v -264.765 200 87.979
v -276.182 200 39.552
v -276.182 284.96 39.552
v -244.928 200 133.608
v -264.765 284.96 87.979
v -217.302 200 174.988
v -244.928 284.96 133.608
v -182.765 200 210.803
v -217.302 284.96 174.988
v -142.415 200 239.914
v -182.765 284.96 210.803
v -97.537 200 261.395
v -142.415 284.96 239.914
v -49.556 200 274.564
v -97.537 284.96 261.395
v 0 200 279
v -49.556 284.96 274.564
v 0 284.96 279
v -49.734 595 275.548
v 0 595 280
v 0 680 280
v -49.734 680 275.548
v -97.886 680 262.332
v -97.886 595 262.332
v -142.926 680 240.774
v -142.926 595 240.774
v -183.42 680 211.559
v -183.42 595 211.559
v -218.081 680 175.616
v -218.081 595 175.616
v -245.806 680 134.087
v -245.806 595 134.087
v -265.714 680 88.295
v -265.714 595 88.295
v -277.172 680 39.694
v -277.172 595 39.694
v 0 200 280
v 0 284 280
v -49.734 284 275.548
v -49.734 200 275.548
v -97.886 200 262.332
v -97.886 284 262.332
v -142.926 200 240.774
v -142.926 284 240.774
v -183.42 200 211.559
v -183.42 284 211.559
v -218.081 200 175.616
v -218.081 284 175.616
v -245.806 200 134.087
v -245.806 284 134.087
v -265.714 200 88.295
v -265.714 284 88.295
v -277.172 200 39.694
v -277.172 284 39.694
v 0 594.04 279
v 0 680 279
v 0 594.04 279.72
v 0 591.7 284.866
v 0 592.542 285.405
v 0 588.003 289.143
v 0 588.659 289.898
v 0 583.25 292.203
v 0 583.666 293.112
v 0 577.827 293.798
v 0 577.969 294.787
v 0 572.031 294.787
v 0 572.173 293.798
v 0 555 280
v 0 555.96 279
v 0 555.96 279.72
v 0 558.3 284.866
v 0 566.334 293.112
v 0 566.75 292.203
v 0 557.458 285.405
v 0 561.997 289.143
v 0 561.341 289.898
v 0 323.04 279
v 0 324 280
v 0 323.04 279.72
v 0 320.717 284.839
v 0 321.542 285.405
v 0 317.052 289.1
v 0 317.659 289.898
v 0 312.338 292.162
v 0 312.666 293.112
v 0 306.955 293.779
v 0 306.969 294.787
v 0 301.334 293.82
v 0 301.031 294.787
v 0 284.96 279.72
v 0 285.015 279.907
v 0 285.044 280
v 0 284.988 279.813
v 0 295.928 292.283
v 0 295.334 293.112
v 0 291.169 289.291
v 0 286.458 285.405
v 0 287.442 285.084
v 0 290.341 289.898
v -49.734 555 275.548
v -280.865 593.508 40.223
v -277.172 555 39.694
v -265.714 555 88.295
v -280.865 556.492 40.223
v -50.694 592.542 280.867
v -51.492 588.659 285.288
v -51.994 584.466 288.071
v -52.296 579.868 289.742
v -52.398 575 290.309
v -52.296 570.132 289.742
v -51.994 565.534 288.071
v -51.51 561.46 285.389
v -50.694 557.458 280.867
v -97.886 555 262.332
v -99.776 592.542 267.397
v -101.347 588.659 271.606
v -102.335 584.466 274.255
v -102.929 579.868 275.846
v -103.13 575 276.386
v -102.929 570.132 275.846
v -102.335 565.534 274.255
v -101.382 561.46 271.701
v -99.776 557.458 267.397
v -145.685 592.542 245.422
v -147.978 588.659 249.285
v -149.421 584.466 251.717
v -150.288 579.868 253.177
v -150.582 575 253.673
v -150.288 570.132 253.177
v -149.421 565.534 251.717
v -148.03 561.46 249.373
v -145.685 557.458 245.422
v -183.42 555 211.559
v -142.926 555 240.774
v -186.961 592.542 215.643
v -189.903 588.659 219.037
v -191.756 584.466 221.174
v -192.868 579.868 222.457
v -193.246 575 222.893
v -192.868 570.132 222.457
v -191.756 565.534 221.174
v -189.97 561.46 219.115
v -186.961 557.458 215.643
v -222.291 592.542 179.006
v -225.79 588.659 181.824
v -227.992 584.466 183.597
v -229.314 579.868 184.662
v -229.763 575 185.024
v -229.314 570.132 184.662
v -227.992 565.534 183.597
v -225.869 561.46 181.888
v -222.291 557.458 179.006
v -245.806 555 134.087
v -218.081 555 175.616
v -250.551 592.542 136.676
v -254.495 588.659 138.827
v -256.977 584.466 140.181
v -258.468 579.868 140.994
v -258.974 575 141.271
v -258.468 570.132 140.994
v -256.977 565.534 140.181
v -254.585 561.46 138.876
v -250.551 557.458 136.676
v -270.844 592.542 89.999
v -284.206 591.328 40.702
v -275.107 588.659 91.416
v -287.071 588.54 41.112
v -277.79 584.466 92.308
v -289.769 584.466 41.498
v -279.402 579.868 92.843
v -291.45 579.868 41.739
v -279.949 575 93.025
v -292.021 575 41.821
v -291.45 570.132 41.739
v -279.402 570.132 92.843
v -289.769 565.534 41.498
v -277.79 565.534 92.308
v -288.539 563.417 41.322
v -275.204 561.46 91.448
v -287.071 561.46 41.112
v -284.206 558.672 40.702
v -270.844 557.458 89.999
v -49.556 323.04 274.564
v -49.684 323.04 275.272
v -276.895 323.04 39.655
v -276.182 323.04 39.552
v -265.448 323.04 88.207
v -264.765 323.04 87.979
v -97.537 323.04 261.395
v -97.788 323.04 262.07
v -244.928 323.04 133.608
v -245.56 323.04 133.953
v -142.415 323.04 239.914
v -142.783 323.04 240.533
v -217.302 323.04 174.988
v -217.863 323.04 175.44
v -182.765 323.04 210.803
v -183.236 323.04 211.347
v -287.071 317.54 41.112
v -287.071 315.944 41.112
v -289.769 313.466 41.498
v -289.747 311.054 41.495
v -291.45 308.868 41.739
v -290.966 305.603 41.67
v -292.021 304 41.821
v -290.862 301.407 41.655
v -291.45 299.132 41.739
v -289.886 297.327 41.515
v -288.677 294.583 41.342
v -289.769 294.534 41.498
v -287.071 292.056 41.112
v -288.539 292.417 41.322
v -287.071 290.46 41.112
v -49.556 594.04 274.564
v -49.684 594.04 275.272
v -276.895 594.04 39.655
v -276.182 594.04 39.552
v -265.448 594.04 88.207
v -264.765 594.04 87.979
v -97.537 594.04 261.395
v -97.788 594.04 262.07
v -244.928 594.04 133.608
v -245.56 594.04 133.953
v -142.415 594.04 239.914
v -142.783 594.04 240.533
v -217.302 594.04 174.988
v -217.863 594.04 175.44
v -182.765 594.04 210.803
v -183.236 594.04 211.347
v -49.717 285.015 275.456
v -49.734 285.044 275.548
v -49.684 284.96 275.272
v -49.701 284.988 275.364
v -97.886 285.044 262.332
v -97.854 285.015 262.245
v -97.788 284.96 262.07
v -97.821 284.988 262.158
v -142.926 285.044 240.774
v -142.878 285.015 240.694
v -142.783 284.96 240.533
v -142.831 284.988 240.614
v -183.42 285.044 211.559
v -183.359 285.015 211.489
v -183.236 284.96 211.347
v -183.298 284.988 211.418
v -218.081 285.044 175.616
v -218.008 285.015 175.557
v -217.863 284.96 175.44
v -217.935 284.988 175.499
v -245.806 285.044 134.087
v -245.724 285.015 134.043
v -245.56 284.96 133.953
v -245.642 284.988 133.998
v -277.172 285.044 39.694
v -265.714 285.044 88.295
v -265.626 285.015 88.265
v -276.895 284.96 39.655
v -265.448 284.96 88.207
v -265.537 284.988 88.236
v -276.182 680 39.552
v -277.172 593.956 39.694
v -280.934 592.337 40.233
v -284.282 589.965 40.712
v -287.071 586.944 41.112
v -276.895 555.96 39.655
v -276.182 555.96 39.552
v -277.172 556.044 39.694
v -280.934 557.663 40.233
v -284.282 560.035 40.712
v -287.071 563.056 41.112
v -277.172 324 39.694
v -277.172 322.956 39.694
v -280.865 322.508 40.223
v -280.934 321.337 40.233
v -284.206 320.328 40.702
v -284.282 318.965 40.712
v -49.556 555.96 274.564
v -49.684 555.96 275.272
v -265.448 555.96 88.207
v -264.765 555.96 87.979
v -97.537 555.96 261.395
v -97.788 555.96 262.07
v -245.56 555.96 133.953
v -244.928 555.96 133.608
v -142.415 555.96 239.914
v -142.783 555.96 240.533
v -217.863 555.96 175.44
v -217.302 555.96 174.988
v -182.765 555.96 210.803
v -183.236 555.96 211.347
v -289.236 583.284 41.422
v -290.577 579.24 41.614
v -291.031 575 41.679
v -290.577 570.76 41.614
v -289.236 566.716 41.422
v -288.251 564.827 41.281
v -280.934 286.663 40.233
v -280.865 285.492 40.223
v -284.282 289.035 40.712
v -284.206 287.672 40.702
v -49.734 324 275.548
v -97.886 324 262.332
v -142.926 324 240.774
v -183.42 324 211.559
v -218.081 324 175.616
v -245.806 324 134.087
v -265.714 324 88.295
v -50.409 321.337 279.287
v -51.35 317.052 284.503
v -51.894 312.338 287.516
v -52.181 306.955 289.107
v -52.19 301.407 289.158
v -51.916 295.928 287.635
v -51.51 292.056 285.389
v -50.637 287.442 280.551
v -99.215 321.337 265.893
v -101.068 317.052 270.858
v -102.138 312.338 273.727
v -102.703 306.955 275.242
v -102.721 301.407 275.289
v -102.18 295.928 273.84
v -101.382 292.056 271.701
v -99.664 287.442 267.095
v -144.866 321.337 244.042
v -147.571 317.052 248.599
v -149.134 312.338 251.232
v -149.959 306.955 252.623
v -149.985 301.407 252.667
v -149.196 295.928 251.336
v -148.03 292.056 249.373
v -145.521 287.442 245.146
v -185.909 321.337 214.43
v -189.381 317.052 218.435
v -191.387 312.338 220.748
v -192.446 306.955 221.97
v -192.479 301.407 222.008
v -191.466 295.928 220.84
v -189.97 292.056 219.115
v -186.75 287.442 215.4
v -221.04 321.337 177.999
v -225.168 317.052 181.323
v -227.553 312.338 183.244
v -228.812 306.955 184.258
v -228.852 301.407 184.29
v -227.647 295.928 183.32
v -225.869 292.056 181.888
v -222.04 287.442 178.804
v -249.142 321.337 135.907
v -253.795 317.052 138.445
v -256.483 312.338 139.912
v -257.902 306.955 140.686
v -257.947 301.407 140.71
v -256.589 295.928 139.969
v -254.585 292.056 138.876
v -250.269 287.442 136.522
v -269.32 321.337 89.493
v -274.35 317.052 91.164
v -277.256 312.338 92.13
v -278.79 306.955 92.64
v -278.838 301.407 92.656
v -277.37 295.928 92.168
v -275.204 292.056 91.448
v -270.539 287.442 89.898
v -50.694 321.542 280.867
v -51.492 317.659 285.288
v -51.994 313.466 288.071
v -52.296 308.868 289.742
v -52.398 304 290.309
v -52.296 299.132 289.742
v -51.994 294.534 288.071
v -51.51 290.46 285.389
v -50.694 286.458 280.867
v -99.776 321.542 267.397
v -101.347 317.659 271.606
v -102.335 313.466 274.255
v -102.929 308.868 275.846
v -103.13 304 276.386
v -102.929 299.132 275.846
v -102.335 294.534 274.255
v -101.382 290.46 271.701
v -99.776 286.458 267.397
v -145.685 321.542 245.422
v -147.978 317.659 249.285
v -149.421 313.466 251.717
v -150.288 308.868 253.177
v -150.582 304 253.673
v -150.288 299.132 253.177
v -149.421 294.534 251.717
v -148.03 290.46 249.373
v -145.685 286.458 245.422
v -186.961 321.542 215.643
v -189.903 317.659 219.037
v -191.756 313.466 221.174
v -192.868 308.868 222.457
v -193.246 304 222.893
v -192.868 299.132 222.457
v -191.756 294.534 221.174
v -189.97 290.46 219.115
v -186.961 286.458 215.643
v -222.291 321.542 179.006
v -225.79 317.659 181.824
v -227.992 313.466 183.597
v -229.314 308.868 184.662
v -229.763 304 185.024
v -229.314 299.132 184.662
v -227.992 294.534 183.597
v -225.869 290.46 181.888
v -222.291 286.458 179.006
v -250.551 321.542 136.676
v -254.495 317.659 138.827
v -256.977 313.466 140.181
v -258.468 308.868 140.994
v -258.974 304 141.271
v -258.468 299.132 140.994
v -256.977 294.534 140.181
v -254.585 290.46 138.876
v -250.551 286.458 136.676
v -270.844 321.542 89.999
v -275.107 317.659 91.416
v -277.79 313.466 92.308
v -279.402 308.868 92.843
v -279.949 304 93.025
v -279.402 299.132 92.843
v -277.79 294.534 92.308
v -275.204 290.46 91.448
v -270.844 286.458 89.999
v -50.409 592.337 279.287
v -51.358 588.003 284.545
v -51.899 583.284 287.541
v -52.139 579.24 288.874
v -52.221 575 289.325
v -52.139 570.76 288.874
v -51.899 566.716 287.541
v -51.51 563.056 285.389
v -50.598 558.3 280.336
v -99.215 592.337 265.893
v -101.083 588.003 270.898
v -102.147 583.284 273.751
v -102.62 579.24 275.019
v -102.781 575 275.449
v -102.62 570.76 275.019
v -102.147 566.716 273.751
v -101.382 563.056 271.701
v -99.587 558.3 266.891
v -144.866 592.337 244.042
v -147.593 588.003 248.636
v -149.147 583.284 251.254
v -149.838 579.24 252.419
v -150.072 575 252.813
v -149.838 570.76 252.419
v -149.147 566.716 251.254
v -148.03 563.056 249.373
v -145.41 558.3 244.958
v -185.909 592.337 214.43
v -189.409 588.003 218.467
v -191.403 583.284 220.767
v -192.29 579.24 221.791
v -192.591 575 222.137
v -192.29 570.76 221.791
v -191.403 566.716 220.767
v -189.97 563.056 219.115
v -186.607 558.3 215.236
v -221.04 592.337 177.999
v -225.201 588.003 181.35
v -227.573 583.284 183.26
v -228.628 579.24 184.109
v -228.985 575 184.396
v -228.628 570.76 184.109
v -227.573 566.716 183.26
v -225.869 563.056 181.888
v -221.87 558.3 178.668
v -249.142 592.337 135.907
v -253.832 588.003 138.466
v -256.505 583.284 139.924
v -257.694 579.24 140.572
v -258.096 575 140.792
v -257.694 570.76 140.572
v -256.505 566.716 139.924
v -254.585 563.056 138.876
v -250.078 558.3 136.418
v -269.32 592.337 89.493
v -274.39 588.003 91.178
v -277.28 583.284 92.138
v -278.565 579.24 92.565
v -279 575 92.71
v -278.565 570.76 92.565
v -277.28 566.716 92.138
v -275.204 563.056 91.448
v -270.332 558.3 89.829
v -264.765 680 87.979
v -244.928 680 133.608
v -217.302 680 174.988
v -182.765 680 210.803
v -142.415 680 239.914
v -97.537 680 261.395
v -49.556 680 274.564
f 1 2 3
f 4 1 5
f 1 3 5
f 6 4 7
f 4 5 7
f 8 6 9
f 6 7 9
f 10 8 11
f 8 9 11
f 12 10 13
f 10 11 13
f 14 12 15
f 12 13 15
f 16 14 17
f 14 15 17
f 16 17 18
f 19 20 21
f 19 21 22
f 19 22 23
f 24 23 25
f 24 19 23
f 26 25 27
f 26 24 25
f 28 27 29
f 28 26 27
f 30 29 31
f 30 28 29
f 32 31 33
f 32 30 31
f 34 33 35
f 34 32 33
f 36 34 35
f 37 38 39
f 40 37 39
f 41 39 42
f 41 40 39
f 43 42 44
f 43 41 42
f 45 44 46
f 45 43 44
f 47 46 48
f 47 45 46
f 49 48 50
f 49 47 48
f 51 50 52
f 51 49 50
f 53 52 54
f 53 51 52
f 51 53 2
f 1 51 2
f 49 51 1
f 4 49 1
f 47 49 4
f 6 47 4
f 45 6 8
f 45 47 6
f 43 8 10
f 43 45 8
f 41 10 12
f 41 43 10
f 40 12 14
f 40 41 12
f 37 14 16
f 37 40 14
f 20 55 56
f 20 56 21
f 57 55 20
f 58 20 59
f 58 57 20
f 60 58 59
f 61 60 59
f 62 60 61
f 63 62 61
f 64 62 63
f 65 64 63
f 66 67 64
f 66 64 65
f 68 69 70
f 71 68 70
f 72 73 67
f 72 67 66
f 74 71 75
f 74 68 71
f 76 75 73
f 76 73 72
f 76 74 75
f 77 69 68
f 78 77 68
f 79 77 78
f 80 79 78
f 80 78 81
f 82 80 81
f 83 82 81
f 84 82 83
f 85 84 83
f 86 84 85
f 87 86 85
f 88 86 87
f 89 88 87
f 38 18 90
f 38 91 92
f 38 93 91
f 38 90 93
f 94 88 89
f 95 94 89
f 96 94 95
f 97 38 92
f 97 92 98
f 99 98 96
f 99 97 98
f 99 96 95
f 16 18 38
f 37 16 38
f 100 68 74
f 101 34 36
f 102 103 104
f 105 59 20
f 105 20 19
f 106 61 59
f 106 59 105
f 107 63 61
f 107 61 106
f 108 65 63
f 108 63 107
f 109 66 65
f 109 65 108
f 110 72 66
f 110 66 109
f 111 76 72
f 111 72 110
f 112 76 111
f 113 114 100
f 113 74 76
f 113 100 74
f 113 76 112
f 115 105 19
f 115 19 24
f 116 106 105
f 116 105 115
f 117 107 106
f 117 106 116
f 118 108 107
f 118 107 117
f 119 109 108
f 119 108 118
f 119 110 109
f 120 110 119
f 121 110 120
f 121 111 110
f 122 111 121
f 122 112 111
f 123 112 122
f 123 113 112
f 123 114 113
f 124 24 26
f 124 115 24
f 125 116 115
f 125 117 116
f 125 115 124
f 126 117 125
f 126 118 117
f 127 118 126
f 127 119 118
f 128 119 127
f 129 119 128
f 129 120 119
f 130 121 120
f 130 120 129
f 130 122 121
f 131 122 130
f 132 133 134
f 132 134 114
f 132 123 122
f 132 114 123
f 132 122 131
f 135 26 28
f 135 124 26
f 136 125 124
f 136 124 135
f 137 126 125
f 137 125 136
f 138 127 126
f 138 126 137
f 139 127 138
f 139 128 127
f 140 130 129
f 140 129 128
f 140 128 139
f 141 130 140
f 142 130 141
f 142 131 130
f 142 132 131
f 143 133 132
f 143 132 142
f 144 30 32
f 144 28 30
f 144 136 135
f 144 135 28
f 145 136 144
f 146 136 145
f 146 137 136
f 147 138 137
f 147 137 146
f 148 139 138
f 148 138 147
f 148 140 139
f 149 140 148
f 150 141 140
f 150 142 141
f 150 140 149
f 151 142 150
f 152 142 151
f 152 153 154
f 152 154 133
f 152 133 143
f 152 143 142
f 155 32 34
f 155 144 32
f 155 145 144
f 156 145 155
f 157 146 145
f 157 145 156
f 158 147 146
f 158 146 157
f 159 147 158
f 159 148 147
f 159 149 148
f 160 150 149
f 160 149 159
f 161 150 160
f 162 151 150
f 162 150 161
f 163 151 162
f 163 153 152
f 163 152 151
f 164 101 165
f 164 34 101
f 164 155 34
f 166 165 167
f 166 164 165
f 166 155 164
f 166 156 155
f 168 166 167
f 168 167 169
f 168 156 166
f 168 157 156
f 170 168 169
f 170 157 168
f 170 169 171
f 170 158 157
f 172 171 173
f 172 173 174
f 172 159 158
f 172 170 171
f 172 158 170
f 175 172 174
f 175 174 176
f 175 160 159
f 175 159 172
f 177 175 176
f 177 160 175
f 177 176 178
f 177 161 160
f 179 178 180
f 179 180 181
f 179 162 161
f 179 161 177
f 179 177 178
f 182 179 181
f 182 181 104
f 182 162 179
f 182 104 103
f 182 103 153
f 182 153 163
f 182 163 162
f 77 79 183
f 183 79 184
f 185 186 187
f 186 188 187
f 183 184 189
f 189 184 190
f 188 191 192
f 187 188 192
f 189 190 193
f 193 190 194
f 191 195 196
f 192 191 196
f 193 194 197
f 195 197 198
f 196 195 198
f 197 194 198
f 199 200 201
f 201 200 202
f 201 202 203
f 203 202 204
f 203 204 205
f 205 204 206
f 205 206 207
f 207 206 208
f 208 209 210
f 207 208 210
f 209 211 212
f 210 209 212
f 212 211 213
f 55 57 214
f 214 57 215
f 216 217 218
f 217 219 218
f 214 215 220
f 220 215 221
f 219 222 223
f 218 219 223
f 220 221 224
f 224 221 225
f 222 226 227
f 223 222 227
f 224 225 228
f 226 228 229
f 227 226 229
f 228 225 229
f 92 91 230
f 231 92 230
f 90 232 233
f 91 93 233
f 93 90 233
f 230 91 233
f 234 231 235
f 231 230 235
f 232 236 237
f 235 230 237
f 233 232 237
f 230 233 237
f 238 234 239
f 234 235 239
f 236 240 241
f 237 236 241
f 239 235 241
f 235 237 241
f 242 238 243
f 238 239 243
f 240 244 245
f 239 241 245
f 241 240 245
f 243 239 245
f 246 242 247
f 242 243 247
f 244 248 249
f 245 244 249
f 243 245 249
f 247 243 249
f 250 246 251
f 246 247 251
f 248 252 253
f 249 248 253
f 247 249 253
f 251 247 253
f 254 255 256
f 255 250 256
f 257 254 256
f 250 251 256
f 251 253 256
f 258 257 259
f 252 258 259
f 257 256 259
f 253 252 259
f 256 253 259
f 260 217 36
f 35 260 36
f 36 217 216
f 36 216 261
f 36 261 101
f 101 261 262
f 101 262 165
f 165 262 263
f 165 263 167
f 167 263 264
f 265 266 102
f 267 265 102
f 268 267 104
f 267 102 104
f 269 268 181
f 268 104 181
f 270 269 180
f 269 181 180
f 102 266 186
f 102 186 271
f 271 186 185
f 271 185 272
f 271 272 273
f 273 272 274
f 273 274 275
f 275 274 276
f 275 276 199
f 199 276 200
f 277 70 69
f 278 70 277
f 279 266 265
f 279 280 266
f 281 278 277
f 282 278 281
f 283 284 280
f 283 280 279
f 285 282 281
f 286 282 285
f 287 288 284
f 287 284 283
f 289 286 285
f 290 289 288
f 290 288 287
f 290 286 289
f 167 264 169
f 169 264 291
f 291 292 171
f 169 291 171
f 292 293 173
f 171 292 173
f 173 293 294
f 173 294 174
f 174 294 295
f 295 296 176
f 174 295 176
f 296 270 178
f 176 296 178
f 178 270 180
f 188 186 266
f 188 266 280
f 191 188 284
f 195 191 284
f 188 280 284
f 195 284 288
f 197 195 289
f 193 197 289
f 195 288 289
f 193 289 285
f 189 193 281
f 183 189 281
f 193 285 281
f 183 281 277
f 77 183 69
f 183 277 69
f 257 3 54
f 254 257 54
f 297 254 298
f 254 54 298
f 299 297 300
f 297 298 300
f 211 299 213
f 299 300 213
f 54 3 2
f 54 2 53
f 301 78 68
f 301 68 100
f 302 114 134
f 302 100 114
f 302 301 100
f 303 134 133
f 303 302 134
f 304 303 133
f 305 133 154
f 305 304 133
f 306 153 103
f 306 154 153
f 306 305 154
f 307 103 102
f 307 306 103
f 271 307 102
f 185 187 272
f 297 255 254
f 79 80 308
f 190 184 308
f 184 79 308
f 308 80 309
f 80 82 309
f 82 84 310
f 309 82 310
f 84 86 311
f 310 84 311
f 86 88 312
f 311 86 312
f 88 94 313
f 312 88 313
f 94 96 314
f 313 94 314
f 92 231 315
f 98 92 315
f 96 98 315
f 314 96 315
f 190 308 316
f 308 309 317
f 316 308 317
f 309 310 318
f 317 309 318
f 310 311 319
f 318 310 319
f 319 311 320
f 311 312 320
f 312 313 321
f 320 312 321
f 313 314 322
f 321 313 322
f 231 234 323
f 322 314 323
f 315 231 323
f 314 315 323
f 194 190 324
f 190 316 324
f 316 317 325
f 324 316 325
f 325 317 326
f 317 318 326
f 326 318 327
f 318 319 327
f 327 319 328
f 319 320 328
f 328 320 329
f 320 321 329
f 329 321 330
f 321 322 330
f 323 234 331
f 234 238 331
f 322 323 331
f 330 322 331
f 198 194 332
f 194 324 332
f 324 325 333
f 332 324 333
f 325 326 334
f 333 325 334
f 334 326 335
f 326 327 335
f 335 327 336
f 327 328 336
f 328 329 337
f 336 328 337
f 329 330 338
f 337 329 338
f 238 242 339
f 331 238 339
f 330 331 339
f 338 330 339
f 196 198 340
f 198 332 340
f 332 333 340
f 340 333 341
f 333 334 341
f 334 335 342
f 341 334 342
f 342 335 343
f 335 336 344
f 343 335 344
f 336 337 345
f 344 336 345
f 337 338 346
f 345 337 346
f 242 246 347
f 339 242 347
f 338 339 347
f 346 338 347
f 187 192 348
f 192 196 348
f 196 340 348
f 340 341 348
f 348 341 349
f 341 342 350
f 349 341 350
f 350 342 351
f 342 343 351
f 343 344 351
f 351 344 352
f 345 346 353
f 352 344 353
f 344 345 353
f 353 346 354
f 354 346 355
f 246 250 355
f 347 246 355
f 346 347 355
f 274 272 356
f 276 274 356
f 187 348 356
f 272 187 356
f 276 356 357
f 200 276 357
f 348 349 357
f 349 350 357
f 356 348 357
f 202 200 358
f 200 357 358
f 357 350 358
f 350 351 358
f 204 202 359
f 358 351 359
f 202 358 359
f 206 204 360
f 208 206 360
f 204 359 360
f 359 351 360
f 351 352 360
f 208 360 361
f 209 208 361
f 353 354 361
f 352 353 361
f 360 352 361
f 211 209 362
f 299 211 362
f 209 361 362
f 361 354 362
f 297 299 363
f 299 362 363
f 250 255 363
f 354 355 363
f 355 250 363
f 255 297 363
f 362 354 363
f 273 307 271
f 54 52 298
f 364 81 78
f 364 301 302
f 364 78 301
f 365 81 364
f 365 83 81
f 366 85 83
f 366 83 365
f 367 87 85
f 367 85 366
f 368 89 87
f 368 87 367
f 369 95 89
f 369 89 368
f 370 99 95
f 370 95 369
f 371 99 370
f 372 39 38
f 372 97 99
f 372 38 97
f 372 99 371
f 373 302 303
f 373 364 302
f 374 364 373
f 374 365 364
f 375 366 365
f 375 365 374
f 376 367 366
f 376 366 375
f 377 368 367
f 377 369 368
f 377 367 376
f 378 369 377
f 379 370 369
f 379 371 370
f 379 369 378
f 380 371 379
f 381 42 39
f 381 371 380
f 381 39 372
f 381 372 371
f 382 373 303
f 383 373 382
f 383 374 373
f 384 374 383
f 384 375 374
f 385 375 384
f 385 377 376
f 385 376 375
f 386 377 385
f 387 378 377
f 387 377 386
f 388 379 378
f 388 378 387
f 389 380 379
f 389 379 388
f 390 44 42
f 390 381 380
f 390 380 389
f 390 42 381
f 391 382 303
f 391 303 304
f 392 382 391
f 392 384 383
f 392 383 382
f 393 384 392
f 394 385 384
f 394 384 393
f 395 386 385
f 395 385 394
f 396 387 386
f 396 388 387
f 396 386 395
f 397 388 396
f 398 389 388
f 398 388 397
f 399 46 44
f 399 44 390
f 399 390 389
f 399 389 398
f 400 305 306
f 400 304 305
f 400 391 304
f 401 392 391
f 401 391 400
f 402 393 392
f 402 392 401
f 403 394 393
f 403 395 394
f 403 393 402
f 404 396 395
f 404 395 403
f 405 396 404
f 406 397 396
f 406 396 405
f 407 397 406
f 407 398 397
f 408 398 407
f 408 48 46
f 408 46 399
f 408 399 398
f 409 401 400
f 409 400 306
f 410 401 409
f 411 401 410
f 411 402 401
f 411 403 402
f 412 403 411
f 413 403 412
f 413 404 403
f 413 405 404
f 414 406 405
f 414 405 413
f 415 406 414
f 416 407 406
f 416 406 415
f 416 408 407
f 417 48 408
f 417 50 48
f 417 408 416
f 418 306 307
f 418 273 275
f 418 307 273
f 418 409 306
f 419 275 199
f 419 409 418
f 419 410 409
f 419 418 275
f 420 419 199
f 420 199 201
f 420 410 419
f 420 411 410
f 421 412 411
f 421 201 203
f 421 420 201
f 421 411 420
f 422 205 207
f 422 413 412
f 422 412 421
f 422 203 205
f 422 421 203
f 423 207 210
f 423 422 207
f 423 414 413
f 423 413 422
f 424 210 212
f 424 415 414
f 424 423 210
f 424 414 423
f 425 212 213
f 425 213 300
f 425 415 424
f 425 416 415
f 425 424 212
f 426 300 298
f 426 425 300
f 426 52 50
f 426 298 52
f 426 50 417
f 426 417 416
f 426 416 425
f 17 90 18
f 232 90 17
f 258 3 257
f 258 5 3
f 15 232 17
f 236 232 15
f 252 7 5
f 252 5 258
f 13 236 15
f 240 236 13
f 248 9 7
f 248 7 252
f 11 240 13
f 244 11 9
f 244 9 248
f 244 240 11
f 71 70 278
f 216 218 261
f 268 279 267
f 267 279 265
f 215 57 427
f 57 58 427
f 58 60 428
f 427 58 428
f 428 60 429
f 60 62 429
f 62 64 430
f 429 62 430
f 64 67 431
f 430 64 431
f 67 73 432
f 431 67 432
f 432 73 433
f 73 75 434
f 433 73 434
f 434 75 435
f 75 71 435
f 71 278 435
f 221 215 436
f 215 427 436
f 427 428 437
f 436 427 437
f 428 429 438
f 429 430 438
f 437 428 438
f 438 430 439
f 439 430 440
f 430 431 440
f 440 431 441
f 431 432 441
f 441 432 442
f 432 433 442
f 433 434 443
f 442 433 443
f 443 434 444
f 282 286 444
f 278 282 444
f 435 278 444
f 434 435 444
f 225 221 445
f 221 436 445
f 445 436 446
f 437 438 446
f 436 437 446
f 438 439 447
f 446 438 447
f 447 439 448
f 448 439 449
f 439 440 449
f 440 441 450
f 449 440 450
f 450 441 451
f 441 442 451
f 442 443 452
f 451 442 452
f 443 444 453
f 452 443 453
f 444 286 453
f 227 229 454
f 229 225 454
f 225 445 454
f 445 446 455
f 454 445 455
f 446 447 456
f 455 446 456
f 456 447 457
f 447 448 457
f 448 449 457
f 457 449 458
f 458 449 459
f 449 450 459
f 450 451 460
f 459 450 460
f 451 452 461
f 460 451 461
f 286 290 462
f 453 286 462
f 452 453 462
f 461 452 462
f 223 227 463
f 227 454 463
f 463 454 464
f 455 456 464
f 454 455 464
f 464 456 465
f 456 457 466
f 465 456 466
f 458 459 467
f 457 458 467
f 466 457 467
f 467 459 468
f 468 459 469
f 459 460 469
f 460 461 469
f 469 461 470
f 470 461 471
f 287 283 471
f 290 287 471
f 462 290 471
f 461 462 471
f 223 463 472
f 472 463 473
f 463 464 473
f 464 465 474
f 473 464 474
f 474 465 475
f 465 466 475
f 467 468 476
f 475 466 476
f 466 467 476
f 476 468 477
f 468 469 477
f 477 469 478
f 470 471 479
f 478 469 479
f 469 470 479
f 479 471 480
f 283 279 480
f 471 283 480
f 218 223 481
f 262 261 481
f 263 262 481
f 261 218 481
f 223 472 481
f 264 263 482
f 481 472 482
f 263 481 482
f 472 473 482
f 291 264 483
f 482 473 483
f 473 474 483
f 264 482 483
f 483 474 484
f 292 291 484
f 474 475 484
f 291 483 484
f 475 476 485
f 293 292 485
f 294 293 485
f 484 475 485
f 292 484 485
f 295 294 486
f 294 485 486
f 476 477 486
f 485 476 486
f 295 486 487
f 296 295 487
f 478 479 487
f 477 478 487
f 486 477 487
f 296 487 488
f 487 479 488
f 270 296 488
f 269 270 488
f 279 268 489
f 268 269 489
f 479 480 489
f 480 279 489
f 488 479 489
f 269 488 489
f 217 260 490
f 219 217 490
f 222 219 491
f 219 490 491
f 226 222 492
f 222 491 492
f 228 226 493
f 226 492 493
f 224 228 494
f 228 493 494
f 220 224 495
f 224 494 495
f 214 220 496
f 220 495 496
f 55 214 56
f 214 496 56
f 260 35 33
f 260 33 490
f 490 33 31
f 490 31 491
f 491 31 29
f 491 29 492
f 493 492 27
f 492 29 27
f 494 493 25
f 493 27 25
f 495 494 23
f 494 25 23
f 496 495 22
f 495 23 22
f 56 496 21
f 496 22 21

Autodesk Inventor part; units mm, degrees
ref_plane "YZ Plane" through (0, 0, 0) normal (1, 0, 0) x (0, 1, 0)
ref_plane "XZ Plane" through (0, 0, 0) normal (0, 1, 0) x (-1, 0, 0)
sketch "Sketch1" plane through (0, 0, 0) normal (0, 0, 1) x (1, 0, 0)
  line L0 (0, 0) -> (0, 15)
  line L1 (0, 850) -> (-280, 850)
  line L2 (-280, 850) -> (-280, 595)
  line L3 (-280, 0) -> (0, 0)
  arc A0 (-280, 324) -> (-280, 284) centre (-274.1667, 304) ccw
  line L4 (-280, 0) -> (-278, 0)
  line L5 (-278, 0) -> (-278, 15)
  line L6 (-278, 15) -> (0, 15)
  arc A1 (-280, 595) -> (-280, 555) centre (-274.1667, 575) ccw
  line L7 (-278, 15) -> (-280, 15)
  line L8 (-280, 15) -> (-280, 0)
  line L9 (0, 15) -> (0, 850)
  line L10 (-279, 15) -> (-279, 284.96)
  line L11 (-279, 849) -> (-1, 849)
  line L12 (-1, 849) -> (-1, 15)
  line L13 (-279, 849) -> (-279, 850)
  line L14 (-279, 16) -> (-1, 16)
  line L15 (-1, 16) -> (0, 16)
  arc A2 (-279.72, 594.04) -> (-279.72, 555.96) centre (-274.1667, 575) ccw
  line L16 (-279.72, 555.96) -> (-279, 555.96)
  line L17 (-279.72, 594.04) -> (-279, 594.04)
  line L18 (-279, 594.04) -> (-279, 849)
  line L19 (-279, 555.96) -> (-279, 594.04)
  line L20 (-280, 556.0439) -> (-280, 555)
  line L21 (-280, 593.9561) -> (-280, 556.0439)
  line L22 (-280, 595) -> (-280, 593.9561)
  line L23 (-280, 555) -> (-280, 324)
  arc A3 (-279.72, 323.04) -> (-280, 285.0439) centre (-274.1667, 304) ccw
  line L24 (-279.72, 323.04) -> (-279, 323.04)
  line L25 (-279.72, 284.96) -> (-279, 284.96)
  arc A4 (-280, 285.0439) -> (-279.72, 284.96) centre (-274.1667, 304) ccw
  line L26 (-280, 284) -> (-280, 15)
  line L27 (-279, 284.96) -> (-279, 555.96)
  line L28 (-280, 322.9561) -> (-280, 284)
  line L29 (-280, 324) -> (-280, 322.9561)
  point P0 (-295, 304)
  point P1 (-295, 575)
  dimension "d0" = 850
  dimension "d1" = 280
  dimension "d2" = 40
  dimension "d3" = 15
  dimension "d5" = 2
  dimension "d6" = 15
  dimension "d7" = 284
  dimension "d8" = 40
  dimension "d9" = 15
  dimension "d10" = 255
  dimension "d14" = 1
  dimension "d15" = 1
  dimension "d16" = 1
  dimension "d17" = 1
revolve "Revolution1" add sketch "Sketch1" angle 360 about axis through (0, 15, 0) along (0, 1, 0) contours L6 L12 L15 L9 | L3 L8 L7 L5 | L6 L7 L10 L14 L12 | L26 L28 A4 L25 L10 L7 | L13 L18 L17 A2 L22 L2 L1 | A0 L29 A3 L28 | L23 L20 A2 L16 L27 L24 A3 L29 | L22 A2 L20 A1
ref_plane "Work Plane2" through (0, 200, 0) normal (0, -1, 0) x (1, 0, 0)
sketch "Sketch5" plane through (0, 200, 0) normal (0, -1, 0) x (1, 0, 0)
  circle A0 centre (0, 0) radius 280 projected
  circle A1 centre (0, 0) radius 280 projected
  circle A2 centre (0, 0) radius 280 projected
  circle A3 centre (0, 0) radius 280 projected
  circle A4 centre (0, 0) radius 290
  line L0 (0, 0) -> (-276.1822, 39.5525)
  line L1 (0, 0) -> (276.1822, 39.5525)
  line L2 (0, 0) -> (0, 290)
  circle A5 centre (0, 0) radius 279 projected
  line L3 (-276.1822, 39.5525) -> (-287.0711, 41.1119)
  line L4 (276.1822, 39.5525) -> (287.0711, 41.1119)
  circle A6 centre (0, 0) radius 390
  line L5 (-287.0711, 41.1119) -> (-386.0611, 55.2884)
  line L6 (276.1822, 39.5525) -> (386.0611, 55.2884)
  line L7 (0, 279) -> (0, 390)
  dimension "d29" = 10
  dimension "d30" = 81.85
  dimension "d31" = 163.7
  dimension "d32" = 100
extrude "Extrusion2" cut sketch "Sketch5" against normal blind 480 contours L3 A4 L2 A0 | A0 L2 A5 L3 | L5 A6 L7 A4 keep common part
properties part number "Fass"
